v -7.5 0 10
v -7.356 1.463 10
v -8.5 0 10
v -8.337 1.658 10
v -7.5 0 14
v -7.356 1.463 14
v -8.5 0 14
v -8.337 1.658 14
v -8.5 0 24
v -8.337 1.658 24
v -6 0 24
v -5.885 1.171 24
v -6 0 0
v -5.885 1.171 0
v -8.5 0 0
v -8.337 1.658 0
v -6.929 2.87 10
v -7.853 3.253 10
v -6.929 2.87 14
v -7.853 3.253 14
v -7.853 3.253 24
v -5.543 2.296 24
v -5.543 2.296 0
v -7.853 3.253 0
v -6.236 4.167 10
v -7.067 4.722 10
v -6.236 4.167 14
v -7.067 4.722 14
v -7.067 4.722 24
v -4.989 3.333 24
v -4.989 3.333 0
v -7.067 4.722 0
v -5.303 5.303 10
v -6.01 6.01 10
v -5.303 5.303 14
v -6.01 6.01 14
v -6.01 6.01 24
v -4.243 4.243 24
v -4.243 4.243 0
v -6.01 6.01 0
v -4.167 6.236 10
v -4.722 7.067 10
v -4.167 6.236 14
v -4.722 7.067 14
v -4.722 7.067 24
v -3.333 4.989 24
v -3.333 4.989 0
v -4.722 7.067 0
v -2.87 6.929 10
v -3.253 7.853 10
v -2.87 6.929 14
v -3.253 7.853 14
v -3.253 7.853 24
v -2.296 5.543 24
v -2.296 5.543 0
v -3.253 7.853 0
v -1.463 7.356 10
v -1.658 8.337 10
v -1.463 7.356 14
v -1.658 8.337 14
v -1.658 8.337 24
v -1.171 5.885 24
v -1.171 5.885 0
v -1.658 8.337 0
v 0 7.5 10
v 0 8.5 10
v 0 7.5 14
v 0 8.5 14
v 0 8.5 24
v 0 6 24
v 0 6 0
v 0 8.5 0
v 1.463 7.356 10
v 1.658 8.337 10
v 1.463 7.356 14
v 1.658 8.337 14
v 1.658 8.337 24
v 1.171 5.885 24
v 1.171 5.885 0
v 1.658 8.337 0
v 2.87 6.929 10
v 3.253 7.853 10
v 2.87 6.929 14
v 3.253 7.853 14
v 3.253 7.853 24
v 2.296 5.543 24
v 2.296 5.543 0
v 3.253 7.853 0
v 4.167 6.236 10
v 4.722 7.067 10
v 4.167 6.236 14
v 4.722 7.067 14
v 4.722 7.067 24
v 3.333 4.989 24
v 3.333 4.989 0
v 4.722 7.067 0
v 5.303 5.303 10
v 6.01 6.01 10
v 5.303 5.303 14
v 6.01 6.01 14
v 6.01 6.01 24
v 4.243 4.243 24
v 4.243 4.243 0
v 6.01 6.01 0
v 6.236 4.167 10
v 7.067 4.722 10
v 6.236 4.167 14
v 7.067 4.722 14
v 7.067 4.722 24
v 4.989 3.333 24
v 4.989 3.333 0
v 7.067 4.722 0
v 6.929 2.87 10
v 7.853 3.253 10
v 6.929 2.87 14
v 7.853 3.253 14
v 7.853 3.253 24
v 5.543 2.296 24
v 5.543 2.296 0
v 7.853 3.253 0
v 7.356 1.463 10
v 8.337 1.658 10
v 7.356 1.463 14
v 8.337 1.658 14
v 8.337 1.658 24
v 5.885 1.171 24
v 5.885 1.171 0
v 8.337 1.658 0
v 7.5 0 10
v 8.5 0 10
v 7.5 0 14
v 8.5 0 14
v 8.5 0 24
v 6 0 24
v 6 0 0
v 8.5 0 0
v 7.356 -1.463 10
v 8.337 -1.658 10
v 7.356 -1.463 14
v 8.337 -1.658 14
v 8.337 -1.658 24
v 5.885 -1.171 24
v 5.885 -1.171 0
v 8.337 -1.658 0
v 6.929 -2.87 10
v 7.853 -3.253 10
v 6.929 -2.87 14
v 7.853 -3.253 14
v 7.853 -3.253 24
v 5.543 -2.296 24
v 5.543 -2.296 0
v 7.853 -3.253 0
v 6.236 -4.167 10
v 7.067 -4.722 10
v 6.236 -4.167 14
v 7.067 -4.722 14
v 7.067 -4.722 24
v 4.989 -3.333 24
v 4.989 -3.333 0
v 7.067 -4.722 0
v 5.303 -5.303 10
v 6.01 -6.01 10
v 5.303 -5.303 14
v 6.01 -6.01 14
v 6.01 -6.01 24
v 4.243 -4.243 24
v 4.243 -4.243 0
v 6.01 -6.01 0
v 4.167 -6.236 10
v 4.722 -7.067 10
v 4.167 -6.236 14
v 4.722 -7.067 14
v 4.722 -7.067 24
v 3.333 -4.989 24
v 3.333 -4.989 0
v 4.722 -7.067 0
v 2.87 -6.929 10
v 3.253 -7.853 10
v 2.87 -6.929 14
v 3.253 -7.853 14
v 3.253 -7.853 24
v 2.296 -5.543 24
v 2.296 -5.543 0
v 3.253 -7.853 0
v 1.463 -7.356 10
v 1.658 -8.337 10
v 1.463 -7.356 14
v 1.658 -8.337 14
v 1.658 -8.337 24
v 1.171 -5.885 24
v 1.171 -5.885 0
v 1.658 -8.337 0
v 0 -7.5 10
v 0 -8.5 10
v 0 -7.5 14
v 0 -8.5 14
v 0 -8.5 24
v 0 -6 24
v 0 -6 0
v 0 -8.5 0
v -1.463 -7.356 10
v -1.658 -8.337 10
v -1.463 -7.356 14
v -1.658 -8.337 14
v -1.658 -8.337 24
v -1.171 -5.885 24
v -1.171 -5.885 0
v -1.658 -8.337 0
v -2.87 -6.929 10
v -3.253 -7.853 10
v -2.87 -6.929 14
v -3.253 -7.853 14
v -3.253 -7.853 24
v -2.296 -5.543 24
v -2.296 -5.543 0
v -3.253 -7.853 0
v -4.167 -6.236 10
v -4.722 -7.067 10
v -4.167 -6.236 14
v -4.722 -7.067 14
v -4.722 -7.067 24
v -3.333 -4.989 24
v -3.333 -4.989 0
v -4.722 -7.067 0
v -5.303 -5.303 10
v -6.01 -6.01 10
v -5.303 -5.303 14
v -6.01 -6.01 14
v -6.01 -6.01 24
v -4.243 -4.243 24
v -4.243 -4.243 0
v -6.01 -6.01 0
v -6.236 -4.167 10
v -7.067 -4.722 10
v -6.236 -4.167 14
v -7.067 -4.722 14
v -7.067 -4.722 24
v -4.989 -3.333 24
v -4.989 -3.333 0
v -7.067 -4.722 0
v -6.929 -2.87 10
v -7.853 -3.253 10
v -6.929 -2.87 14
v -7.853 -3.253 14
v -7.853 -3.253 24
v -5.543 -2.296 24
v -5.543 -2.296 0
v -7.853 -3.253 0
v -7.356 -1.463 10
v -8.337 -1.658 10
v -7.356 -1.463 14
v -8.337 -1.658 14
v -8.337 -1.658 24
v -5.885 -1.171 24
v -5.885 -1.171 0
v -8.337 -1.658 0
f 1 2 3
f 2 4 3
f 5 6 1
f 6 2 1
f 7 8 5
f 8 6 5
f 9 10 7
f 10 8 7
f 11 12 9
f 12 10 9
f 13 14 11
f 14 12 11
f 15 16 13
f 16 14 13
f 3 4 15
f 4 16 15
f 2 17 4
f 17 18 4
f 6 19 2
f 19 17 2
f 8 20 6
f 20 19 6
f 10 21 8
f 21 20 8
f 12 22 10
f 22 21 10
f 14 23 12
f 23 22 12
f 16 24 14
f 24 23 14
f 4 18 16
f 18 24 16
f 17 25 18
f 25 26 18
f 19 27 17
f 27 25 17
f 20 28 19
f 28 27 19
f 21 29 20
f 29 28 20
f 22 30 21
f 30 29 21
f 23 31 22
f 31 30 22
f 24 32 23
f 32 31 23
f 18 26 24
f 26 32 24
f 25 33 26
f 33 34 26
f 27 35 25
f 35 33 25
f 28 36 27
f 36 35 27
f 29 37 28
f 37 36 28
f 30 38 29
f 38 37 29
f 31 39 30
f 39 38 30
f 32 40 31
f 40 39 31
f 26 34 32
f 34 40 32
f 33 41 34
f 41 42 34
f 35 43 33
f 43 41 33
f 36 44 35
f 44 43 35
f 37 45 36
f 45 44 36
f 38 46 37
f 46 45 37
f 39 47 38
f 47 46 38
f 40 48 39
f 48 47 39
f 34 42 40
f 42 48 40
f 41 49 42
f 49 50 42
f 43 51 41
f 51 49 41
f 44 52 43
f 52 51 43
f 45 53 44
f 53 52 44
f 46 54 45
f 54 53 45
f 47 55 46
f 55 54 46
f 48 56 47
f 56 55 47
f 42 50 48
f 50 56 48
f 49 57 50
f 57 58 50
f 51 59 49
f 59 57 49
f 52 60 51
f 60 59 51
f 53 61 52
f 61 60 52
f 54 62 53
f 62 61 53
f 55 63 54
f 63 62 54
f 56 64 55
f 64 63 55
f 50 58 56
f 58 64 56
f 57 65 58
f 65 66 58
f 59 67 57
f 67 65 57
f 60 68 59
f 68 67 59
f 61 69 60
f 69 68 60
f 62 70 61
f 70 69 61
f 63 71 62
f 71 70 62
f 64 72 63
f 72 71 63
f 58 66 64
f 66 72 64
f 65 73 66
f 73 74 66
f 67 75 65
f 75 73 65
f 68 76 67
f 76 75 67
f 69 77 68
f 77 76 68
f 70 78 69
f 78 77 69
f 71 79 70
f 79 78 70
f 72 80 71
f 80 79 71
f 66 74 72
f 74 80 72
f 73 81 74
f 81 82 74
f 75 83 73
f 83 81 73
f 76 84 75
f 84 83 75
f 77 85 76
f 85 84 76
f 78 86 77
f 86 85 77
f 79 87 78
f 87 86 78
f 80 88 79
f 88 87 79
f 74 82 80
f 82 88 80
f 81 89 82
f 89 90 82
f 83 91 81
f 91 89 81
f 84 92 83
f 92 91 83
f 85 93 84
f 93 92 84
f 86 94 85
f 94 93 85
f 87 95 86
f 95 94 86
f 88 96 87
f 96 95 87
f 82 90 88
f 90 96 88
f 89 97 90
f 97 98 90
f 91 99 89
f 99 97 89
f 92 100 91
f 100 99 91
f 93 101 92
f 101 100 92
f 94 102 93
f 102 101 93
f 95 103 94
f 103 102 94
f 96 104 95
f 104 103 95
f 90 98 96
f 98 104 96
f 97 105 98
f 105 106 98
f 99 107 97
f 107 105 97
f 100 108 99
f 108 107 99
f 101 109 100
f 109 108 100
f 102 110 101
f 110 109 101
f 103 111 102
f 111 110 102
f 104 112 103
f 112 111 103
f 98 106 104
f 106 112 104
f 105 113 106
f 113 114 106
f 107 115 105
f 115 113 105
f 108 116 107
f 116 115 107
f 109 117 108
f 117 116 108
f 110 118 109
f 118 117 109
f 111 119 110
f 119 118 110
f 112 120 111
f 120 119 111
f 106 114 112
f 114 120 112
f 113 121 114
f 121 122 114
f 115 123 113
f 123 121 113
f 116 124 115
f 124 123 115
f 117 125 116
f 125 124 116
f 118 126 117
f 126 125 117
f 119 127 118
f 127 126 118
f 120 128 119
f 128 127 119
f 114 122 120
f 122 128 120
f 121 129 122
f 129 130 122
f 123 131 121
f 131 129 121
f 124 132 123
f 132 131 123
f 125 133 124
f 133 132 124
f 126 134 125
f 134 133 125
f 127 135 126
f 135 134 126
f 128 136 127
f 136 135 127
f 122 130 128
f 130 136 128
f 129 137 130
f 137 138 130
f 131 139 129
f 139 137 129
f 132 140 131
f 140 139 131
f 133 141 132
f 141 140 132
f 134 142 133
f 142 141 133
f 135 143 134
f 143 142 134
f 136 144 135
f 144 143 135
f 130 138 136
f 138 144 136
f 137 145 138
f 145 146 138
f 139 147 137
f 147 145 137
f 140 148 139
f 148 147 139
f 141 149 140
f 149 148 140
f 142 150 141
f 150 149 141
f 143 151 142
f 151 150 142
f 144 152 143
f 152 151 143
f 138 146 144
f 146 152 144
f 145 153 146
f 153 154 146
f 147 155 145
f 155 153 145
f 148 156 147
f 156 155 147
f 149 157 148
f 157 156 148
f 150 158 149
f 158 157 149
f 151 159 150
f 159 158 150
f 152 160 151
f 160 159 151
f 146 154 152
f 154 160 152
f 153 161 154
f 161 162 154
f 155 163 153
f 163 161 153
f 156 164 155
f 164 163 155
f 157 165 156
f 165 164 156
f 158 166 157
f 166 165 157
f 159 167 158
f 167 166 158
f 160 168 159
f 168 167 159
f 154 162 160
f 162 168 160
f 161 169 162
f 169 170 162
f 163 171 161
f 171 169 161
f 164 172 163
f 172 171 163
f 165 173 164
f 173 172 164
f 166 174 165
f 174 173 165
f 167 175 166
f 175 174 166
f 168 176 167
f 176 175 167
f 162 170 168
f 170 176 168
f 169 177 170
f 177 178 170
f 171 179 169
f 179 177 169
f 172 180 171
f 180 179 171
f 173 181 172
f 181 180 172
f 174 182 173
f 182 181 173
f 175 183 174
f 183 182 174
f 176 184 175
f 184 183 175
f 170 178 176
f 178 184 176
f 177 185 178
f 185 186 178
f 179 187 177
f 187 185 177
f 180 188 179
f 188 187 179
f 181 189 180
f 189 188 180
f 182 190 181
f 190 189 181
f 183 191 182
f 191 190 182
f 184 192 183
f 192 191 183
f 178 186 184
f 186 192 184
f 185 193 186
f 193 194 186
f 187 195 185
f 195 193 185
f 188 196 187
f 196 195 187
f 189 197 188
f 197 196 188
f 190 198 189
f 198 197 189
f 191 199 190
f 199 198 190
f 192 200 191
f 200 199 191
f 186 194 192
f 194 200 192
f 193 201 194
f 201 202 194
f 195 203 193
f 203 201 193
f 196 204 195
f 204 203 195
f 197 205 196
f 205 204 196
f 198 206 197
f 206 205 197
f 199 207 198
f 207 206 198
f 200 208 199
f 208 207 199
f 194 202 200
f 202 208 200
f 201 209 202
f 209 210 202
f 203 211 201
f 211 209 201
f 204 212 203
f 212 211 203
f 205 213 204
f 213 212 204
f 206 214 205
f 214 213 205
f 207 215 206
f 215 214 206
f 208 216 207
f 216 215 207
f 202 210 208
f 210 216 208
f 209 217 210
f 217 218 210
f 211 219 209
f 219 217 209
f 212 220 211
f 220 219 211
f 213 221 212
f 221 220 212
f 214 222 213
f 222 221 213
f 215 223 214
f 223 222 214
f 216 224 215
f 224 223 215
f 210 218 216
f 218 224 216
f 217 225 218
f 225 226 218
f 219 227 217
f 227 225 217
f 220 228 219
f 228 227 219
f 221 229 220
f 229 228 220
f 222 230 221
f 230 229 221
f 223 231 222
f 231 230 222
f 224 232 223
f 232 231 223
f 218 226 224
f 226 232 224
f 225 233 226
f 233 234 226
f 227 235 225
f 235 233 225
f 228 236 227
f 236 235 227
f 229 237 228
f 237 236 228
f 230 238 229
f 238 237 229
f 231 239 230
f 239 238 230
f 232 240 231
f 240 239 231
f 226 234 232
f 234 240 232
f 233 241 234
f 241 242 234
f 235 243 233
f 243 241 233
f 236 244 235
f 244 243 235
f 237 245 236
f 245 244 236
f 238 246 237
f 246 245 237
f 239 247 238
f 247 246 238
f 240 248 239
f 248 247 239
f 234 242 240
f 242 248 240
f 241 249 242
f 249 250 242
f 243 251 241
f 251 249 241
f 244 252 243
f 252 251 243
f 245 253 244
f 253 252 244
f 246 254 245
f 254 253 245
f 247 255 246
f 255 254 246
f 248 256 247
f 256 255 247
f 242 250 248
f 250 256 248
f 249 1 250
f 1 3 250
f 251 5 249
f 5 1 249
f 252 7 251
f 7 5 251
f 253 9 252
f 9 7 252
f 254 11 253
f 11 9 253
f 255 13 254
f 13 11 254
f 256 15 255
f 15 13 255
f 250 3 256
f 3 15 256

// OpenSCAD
$fn = 32;

// ----------------------------------------------------------------------
// Grooved revolve: stepped, bore R6
// ----------------------------------------------------------------------

// --- parameters (mm) ---
bore_r = 6;               // bore radius
outer_r = 8.5;            // outer radius of the body
total_h = 24;             // overall height, Z
wall = 2.5;               // radial wall thickness
groove_w = 4;             // groove width
groove_d = 1;             // groove depth
grooves = 1;              // number of outer grooves

bbox_x = 2 * outer_r;  // full diameter
bore_d = 2 * bore_r;  // bore diameter
body_d = 2 * outer_r;  // body diameter
revolve_angle = 360;  // full turn around the Z axis

profile = [[6, 0], [8.5, 0], [8.5, 10], [7.5, 10], [7.5, 14], [8.5, 14], [8.5, 24], [6, 24]];  // primary outline, 8 points, counter clockwise

// --- the one profile operation ---
rotate_extrude(angle = revolve_angle) polygon(points = profile);
